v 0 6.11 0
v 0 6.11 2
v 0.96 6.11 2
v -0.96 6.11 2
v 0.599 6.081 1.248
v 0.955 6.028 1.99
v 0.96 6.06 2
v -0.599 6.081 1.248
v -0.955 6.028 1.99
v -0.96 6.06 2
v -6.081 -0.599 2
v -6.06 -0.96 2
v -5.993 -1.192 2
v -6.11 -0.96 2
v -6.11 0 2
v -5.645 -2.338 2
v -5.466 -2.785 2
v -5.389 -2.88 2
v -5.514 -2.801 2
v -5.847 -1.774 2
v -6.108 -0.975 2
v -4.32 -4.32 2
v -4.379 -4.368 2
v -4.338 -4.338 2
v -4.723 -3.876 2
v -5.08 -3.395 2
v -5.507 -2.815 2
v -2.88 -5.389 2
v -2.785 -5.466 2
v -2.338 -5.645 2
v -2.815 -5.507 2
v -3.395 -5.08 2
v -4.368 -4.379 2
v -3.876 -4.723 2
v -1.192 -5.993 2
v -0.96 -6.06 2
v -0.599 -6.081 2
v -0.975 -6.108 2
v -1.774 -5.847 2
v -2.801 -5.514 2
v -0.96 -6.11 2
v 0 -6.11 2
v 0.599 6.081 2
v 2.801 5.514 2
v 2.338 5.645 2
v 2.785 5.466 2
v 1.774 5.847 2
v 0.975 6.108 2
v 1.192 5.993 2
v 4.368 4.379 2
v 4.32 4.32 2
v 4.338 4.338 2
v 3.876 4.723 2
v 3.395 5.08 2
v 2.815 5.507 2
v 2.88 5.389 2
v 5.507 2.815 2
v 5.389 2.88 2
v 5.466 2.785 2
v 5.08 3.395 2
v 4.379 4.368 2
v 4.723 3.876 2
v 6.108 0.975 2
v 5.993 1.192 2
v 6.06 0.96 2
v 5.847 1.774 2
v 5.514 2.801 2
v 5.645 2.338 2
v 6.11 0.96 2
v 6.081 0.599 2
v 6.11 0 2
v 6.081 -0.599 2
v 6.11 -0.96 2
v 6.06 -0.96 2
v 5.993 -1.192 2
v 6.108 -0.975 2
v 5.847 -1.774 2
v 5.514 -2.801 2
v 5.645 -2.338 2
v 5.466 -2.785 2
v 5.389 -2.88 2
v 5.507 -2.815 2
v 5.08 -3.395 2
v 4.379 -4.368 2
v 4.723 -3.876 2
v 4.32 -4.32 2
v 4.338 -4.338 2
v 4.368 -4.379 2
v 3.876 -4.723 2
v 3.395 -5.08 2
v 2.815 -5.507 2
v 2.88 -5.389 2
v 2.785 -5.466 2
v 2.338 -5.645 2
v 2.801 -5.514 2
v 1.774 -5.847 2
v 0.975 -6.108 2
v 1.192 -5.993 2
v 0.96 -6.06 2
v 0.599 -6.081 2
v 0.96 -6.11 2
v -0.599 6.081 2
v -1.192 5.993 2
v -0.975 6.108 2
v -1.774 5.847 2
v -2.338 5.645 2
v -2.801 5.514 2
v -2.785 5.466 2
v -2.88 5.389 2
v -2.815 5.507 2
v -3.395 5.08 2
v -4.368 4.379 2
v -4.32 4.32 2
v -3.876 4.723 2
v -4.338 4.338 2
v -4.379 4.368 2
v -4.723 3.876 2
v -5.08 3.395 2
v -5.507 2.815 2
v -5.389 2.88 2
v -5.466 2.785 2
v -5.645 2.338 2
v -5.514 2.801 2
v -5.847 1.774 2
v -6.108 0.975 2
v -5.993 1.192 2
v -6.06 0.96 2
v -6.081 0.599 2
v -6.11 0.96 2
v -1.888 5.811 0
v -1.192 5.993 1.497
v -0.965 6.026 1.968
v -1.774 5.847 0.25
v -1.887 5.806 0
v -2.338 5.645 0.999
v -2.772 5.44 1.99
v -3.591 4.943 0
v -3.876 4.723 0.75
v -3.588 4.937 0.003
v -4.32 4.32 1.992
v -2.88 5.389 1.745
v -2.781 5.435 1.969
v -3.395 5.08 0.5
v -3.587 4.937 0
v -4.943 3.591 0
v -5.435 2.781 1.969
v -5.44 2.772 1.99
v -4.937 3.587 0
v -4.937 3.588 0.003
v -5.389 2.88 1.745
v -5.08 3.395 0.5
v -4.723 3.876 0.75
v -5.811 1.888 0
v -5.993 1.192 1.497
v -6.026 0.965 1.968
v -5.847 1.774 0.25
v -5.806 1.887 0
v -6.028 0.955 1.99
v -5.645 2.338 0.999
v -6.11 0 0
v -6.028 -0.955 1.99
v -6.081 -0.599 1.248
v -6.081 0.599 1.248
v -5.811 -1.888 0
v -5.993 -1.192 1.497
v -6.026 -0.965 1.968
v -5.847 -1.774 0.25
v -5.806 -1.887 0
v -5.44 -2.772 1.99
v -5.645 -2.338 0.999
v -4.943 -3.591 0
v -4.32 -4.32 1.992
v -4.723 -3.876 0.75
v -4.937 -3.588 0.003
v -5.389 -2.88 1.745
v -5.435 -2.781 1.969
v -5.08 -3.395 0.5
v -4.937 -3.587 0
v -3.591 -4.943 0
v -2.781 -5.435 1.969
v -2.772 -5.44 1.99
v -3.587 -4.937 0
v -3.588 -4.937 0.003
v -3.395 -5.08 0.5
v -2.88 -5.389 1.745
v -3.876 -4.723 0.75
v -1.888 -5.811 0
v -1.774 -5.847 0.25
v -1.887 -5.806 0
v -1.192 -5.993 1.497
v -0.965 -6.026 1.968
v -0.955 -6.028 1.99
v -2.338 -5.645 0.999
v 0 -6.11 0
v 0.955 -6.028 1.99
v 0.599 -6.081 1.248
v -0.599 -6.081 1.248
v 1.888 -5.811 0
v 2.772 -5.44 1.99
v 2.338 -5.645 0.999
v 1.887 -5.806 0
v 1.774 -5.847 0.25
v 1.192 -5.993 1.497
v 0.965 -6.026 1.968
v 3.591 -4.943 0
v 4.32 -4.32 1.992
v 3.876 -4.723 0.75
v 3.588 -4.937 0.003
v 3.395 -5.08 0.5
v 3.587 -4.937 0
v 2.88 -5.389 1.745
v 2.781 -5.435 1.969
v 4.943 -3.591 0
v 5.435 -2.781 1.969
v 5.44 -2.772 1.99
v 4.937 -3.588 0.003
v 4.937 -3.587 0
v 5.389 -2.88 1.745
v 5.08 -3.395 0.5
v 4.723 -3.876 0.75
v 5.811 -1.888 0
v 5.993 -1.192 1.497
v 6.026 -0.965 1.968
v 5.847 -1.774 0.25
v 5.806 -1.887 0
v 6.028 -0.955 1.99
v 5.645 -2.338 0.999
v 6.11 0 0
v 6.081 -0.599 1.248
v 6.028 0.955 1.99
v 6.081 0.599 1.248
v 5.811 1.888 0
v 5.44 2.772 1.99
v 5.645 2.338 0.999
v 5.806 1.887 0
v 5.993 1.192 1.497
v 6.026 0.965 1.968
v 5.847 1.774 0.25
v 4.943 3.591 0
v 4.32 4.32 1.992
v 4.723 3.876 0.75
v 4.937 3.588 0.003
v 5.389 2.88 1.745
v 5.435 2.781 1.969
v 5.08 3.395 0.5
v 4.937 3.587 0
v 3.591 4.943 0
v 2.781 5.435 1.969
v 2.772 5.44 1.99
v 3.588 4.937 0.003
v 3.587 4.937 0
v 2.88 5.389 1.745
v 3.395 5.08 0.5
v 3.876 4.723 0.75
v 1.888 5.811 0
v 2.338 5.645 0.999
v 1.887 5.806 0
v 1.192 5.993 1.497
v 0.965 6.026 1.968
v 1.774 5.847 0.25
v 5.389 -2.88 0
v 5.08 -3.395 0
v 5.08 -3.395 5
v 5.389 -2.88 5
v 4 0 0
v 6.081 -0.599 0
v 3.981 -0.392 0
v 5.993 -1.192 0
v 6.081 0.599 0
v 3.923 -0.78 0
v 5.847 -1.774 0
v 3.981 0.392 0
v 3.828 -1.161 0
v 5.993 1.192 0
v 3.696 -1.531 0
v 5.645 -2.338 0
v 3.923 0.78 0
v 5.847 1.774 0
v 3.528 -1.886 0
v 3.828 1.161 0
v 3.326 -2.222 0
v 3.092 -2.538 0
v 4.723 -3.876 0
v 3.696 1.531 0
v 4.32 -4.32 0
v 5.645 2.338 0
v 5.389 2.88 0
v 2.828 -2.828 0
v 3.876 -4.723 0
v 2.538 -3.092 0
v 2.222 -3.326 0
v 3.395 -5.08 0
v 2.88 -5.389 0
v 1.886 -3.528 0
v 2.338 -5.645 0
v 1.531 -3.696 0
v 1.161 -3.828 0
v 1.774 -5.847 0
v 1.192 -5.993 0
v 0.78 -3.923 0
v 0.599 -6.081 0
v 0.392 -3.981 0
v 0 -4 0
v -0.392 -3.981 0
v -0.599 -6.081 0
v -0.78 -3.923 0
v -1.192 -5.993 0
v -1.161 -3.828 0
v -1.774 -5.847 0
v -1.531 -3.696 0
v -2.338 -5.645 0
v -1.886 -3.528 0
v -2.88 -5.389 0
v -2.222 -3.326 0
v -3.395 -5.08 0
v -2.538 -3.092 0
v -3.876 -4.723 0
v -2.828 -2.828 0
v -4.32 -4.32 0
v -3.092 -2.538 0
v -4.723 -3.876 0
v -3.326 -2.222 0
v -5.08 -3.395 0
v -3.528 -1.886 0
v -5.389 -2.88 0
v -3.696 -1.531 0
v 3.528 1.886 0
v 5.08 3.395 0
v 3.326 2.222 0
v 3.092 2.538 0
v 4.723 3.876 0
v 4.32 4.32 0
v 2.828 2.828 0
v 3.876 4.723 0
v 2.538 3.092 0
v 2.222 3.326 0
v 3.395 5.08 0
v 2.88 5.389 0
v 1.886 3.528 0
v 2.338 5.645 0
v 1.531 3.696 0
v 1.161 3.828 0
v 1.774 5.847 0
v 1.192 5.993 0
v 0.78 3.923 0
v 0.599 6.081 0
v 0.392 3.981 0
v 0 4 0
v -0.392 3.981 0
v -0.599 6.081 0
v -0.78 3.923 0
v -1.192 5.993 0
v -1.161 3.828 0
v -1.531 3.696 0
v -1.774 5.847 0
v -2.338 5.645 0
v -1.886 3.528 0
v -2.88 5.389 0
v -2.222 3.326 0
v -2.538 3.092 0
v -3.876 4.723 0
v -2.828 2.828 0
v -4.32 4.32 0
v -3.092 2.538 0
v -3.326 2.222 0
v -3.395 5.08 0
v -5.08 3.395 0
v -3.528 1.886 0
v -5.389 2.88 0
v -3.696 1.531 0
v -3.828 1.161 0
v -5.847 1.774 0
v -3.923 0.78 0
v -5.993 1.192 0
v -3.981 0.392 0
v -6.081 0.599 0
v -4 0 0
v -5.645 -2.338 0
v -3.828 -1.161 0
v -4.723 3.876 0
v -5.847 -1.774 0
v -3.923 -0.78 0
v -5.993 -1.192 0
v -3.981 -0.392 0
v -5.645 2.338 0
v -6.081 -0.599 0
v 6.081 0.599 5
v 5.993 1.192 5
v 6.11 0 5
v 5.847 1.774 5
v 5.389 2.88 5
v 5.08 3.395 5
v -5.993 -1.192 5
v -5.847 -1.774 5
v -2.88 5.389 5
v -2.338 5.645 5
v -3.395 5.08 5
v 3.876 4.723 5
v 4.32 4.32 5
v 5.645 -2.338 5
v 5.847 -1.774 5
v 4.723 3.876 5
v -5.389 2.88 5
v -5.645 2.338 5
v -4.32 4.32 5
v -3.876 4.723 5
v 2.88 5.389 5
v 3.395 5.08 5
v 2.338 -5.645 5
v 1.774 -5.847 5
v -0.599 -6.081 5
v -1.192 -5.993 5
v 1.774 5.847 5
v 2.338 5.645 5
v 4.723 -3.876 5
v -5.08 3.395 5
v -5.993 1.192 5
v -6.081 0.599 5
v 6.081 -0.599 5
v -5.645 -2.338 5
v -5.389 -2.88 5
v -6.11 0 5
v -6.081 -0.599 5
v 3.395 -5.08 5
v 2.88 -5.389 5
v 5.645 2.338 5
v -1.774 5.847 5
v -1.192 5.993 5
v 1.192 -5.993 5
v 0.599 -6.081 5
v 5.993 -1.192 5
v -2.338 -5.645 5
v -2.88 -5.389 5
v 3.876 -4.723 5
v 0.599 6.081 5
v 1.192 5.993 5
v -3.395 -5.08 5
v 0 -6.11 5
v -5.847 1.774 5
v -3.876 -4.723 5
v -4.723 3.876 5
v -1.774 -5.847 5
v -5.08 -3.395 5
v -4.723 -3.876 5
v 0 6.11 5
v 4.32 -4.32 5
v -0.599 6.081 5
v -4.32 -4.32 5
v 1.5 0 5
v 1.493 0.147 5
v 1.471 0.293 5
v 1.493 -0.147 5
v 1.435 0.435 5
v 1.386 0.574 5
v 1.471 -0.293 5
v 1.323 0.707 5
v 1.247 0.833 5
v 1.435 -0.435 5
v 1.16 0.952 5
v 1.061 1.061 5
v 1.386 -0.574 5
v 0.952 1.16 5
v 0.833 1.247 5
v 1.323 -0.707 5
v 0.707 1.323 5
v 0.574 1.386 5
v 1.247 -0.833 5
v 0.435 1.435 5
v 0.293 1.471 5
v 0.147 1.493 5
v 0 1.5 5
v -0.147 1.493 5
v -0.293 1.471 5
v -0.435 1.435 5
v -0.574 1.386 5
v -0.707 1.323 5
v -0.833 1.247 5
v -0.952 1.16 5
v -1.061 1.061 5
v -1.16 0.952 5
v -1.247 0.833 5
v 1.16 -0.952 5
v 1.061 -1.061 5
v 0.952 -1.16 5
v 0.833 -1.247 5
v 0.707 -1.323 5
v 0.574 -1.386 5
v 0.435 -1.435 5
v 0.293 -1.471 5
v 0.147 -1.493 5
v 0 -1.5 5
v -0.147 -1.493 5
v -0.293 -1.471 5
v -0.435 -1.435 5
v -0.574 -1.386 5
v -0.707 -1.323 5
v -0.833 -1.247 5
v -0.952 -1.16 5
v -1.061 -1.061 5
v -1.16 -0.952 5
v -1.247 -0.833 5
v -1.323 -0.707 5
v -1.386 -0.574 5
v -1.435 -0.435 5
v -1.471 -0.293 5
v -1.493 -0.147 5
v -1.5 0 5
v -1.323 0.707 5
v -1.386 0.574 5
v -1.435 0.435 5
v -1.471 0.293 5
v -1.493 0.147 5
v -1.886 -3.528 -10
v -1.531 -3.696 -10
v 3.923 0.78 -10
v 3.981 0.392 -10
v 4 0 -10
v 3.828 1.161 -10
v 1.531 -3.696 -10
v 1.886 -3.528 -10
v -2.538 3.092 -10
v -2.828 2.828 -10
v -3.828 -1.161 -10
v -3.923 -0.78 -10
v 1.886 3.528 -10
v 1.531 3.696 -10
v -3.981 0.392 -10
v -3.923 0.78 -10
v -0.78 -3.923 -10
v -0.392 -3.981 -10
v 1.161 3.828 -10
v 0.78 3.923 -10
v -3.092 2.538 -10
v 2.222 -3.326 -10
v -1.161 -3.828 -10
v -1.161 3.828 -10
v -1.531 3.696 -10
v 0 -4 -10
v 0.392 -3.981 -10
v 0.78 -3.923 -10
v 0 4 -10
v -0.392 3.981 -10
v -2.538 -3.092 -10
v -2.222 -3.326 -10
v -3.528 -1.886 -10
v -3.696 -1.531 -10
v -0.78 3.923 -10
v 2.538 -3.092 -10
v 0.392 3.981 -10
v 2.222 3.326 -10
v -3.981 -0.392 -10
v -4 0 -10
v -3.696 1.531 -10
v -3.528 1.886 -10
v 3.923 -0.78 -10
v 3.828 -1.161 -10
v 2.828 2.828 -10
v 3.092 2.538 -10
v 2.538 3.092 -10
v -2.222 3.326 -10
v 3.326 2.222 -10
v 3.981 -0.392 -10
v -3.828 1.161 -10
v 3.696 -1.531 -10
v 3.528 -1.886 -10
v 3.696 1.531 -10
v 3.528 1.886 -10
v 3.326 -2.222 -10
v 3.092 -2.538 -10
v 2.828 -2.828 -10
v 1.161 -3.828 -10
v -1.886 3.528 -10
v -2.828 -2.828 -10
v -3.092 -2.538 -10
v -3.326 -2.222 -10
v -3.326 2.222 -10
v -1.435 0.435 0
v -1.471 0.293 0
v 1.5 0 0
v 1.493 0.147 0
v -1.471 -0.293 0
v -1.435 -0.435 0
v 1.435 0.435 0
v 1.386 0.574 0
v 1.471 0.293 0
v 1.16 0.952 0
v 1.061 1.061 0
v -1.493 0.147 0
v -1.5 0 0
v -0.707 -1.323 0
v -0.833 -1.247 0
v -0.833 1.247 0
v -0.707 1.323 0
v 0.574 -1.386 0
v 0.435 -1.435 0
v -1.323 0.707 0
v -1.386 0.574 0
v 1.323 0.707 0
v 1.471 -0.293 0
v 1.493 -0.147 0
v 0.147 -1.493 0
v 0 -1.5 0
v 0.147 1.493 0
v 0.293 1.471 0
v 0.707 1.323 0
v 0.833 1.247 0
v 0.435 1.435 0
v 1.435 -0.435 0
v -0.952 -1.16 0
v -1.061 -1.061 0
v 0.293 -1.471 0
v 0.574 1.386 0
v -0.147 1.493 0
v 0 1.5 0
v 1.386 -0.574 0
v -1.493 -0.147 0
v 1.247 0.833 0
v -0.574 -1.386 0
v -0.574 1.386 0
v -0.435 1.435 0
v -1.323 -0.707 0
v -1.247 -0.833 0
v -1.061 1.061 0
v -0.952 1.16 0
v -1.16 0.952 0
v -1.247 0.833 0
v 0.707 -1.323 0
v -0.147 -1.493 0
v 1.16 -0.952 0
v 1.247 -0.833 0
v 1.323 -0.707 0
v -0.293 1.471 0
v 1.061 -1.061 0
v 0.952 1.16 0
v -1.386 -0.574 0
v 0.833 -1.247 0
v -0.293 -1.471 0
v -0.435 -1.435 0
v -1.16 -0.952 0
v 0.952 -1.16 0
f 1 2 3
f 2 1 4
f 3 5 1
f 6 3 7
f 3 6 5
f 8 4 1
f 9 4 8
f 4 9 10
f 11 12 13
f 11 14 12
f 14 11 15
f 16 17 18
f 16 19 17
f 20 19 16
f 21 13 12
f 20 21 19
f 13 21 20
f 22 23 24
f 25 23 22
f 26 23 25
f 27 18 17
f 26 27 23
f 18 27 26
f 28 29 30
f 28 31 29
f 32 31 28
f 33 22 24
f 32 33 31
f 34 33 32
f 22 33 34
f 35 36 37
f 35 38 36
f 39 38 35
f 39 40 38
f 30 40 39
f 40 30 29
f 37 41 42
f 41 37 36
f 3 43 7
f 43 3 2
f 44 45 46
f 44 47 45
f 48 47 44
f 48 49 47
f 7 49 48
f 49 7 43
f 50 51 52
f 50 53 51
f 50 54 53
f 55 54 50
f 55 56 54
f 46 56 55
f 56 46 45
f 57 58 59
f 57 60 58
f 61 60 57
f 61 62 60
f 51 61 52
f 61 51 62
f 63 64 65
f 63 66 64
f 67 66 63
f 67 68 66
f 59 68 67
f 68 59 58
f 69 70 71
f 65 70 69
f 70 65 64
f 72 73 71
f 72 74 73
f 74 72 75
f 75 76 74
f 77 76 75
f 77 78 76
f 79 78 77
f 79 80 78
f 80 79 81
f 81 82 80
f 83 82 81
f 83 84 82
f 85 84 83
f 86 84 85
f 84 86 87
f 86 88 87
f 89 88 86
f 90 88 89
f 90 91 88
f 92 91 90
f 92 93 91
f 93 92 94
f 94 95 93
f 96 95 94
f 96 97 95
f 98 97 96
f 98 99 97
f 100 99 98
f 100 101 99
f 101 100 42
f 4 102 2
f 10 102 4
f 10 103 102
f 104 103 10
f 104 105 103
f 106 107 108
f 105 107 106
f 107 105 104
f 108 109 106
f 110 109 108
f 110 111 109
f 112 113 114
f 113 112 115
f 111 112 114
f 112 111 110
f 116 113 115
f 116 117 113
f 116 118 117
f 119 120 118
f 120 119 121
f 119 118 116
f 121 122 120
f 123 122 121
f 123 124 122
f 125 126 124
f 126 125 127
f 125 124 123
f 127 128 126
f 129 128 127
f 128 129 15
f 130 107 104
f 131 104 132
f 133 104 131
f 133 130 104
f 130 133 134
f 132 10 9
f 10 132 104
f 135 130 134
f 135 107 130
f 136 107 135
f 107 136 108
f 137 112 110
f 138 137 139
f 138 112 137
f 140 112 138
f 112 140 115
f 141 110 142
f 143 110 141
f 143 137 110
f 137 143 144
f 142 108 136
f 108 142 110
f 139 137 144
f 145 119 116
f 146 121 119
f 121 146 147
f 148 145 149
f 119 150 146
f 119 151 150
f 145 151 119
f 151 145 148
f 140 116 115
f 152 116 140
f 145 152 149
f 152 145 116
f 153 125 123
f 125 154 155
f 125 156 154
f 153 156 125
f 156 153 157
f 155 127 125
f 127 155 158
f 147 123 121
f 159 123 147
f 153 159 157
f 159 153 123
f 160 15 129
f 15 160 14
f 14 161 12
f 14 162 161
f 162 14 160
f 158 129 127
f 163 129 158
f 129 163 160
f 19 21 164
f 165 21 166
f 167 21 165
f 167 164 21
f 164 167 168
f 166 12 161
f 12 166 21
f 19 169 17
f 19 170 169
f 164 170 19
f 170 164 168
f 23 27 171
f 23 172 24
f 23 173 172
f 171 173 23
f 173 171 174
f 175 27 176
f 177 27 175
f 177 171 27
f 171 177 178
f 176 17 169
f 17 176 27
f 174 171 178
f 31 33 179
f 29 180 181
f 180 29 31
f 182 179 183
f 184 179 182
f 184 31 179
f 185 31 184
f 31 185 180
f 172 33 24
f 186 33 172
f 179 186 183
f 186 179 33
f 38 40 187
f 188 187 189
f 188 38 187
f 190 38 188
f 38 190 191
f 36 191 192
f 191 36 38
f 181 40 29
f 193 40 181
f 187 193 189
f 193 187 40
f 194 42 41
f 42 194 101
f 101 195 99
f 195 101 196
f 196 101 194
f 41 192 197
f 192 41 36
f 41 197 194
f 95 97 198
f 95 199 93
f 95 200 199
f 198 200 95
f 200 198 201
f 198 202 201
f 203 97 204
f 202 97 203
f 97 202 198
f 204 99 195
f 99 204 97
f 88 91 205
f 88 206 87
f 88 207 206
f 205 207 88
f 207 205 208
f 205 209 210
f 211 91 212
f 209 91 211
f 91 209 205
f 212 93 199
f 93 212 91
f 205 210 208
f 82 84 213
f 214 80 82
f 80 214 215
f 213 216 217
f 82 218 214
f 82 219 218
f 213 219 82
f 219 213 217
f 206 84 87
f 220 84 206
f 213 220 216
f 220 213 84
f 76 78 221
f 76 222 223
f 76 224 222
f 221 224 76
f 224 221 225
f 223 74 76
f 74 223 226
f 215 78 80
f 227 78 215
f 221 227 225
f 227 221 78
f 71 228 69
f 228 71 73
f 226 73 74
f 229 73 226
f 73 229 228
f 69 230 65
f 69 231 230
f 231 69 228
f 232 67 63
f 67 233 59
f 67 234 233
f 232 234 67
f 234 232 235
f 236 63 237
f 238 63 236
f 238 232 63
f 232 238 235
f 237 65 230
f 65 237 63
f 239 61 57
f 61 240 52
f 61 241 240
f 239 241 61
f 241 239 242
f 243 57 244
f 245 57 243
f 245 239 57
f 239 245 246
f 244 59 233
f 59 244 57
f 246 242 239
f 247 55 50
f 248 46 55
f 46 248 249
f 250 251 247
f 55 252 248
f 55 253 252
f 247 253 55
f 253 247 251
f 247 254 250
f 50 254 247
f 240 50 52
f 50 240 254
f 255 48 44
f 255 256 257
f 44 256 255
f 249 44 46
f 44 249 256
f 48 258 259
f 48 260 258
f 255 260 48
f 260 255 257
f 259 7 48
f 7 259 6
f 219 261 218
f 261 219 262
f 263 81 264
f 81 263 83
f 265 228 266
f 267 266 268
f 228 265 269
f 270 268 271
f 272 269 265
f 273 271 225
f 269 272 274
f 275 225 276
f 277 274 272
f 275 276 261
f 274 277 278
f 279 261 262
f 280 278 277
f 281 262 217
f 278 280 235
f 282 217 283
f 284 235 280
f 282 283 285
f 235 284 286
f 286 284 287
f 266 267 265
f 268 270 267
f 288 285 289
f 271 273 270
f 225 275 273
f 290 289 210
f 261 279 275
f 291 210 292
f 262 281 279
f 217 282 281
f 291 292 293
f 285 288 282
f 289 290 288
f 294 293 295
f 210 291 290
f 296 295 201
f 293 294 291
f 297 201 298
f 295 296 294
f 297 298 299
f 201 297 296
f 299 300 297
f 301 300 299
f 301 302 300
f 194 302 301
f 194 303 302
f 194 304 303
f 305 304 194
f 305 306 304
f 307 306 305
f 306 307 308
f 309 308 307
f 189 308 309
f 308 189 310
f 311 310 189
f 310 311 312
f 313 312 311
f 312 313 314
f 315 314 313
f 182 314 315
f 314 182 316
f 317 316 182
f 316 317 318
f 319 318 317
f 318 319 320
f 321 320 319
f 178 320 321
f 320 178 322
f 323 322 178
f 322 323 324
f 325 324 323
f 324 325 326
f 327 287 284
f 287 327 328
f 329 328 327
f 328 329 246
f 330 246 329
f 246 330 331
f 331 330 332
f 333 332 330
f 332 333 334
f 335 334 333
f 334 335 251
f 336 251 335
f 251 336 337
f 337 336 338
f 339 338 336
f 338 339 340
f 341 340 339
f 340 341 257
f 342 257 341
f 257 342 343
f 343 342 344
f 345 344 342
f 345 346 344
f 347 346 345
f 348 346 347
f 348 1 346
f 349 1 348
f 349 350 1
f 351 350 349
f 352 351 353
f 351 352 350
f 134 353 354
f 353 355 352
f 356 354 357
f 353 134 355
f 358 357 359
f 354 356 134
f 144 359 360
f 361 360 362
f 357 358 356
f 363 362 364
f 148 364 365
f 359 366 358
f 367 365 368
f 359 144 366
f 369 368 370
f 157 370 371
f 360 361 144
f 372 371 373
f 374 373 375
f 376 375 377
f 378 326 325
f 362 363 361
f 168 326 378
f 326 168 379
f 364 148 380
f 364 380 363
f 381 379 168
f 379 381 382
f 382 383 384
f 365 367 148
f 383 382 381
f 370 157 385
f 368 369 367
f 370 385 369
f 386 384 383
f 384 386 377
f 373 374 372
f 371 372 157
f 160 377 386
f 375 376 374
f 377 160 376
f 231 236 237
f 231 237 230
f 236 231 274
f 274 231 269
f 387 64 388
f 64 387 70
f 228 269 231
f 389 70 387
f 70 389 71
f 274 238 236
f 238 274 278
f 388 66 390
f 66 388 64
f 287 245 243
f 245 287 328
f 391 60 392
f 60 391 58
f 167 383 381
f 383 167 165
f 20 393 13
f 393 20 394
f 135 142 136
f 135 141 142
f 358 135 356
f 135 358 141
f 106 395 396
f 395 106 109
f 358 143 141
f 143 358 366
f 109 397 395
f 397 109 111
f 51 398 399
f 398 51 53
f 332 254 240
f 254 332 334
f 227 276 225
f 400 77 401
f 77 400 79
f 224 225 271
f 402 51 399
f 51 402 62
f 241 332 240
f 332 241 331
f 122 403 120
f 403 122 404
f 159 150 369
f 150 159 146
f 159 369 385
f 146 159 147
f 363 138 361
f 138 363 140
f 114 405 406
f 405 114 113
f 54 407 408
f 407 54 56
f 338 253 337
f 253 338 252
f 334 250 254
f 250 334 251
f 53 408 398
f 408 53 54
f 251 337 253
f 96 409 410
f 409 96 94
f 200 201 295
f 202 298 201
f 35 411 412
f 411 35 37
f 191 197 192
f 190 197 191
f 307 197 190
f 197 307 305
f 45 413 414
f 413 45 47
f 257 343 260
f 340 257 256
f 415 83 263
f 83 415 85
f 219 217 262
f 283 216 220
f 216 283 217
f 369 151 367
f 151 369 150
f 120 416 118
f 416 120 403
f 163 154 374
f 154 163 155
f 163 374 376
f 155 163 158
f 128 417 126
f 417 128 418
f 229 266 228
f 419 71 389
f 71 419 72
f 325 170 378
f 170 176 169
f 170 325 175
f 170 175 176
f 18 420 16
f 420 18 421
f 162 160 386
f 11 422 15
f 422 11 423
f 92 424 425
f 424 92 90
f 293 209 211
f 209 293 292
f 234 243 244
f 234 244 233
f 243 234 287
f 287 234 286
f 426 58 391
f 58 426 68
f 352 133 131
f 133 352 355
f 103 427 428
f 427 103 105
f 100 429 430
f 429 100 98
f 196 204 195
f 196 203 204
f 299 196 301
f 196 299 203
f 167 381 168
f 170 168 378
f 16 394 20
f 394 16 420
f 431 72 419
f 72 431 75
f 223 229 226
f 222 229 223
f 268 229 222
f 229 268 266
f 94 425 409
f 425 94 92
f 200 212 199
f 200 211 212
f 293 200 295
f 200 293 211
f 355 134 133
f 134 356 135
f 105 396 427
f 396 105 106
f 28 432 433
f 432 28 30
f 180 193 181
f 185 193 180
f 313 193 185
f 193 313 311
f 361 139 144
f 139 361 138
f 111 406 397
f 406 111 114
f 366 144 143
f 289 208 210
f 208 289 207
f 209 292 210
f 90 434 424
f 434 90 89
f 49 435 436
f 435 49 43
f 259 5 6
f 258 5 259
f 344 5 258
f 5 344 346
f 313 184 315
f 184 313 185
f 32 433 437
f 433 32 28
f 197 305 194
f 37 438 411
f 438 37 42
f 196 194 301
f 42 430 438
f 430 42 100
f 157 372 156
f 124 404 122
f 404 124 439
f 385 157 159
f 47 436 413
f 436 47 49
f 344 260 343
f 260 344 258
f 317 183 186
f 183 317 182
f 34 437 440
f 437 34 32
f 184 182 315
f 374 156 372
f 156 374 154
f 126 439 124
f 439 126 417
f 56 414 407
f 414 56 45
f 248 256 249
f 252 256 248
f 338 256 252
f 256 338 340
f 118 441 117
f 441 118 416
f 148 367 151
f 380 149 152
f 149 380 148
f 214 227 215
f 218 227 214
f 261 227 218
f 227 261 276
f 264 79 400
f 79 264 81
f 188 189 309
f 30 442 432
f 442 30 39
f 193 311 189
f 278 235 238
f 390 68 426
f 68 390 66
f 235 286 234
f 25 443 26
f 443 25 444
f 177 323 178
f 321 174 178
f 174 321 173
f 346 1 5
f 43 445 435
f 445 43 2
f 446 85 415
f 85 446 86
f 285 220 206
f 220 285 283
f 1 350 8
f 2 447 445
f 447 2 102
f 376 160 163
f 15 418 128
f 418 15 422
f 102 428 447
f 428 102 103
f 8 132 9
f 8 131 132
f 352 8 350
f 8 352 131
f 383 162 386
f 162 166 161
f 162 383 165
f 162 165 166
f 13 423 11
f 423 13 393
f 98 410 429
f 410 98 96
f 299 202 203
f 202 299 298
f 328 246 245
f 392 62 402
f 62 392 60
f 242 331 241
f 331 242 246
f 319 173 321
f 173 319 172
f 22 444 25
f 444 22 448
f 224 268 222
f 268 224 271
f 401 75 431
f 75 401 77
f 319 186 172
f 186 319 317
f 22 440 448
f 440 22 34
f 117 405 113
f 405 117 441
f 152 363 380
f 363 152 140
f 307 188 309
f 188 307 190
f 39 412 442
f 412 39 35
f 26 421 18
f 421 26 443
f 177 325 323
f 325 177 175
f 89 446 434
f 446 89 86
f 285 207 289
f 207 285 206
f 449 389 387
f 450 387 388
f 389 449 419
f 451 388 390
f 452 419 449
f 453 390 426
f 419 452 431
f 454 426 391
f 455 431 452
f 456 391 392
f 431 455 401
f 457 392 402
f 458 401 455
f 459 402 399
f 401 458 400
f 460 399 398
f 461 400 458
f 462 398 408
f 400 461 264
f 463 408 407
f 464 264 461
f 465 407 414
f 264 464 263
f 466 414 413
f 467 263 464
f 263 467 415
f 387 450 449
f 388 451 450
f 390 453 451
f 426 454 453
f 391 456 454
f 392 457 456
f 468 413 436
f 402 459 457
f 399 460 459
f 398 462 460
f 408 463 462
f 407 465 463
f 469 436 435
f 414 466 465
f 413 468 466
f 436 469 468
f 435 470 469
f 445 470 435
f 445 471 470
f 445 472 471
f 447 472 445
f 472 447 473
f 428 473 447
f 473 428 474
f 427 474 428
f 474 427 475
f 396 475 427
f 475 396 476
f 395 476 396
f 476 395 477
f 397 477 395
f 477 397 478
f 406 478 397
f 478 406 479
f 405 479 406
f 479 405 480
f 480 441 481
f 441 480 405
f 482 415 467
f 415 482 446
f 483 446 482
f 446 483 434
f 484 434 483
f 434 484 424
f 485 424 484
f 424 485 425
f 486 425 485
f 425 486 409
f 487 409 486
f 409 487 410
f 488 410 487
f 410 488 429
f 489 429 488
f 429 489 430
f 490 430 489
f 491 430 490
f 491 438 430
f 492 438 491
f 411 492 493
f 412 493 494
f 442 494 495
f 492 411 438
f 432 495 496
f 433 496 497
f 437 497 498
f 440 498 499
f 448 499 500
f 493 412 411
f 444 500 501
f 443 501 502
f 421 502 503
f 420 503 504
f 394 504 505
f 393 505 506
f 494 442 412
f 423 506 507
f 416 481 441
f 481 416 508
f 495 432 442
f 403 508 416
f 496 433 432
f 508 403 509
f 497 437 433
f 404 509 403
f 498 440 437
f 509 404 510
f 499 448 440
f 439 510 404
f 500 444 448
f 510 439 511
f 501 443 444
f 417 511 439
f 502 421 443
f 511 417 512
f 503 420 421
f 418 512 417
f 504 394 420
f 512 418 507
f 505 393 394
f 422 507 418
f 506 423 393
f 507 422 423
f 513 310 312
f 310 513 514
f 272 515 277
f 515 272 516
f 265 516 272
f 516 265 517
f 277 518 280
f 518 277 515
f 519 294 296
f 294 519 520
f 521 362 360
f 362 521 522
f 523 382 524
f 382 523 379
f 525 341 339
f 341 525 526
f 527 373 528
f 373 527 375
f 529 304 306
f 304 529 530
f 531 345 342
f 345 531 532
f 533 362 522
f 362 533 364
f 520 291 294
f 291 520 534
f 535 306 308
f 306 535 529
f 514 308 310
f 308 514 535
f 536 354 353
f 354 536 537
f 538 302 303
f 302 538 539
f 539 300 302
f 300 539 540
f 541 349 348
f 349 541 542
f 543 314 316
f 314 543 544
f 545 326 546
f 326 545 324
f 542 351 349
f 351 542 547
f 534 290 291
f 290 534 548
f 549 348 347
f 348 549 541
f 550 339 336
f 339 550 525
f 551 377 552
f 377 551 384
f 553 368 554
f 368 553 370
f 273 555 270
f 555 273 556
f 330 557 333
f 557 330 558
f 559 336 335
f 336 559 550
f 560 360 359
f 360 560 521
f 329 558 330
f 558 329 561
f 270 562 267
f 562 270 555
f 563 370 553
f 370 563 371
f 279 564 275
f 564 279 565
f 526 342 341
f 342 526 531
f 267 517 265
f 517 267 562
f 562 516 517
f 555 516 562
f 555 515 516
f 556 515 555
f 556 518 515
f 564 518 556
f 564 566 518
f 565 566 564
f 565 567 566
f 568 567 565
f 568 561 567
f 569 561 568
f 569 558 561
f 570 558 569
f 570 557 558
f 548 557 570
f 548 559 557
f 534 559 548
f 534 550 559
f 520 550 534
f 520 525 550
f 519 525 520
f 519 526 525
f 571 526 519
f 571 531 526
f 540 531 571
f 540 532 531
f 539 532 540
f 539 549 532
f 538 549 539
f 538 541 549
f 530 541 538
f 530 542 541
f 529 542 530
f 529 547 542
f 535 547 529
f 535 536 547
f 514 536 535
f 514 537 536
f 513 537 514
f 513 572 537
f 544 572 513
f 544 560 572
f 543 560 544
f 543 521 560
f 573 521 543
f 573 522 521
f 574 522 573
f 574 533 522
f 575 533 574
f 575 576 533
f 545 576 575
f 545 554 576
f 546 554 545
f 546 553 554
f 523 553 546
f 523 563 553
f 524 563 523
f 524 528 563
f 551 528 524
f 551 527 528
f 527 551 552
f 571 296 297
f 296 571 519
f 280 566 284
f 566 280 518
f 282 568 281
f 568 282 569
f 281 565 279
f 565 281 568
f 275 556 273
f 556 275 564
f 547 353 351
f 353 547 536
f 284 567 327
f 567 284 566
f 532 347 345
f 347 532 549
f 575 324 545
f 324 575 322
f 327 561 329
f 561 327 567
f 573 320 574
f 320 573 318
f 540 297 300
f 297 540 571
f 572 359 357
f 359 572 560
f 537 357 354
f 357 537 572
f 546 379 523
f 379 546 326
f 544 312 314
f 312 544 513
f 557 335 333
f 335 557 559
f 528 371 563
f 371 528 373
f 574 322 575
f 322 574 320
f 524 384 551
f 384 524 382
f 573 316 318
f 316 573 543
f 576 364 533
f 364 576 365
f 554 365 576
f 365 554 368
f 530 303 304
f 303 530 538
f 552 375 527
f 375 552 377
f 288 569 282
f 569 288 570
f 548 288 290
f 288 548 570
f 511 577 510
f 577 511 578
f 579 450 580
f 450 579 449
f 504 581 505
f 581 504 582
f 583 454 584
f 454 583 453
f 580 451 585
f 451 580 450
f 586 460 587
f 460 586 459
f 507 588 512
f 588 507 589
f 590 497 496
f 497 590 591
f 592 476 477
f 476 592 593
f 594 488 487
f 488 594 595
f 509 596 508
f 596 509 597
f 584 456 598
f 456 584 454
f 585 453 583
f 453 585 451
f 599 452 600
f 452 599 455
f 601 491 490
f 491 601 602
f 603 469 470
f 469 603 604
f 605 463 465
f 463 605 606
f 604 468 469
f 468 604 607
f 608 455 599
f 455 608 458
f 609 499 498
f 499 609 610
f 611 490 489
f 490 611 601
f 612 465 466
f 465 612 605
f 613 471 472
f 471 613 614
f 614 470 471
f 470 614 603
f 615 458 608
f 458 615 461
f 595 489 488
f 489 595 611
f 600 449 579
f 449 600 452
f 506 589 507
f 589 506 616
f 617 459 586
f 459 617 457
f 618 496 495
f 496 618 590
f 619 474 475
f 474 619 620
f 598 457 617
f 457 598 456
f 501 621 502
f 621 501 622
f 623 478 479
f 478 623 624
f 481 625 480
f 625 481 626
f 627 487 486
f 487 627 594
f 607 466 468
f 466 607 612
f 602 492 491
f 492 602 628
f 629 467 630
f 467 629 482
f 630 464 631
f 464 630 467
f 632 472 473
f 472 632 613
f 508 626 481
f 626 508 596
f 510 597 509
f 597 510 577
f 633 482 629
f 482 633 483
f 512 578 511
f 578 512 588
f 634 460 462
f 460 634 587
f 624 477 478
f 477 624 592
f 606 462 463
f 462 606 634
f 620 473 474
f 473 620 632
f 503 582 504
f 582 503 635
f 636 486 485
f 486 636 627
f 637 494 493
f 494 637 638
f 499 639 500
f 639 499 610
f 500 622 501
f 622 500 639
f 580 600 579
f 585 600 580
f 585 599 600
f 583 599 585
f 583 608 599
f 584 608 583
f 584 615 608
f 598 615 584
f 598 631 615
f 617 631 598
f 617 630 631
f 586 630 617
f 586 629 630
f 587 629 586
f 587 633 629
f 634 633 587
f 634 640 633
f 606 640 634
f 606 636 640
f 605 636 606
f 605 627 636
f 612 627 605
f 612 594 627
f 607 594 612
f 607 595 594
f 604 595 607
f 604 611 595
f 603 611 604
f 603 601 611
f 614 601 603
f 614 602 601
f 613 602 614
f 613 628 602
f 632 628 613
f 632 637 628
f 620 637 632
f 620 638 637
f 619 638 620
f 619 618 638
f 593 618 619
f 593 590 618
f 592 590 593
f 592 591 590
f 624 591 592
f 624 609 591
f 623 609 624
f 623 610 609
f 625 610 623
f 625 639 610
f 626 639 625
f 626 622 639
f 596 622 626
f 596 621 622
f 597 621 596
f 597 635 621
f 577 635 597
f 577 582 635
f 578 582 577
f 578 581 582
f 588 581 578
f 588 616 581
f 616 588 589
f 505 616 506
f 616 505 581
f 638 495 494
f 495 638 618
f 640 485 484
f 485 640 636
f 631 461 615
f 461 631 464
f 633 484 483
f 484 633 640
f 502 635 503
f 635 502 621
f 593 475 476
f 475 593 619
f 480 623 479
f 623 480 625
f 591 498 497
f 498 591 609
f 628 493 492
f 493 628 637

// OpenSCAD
module timing_pulley(teeth=20, pitch_diameter=12.22, belt_width=5, hub_diameter=8, hub_height=10) {
    tooth_height = 2;
    tooth_width = pitch_diameter * PI / teeth;
    pulley_height = belt_width + hub_height;
    
    module tooth() {
        translate([0, pitch_diameter / 2, 0])
        rotate([90, 0, 0])
        linear_extrude(height=belt_width)
        polygon(points=[[0, 0], [tooth_width / 2, tooth_height], [-tooth_width / 2, tooth_height]]);
    }
    
    difference() {
        union() {
            // Main pulley body
            cylinder(d=pitch_diameter, h=belt_width, $fn=64);
            
            // Hub
            translate([0, 0, -hub_height])
            cylinder(d=hub_diameter, h=hub_height, $fn=64);
            
            // Teeth
            for (i = [0:teeth-1]) {
                rotate([0, 0, i * 360 / teeth])
                tooth();
            }
        }
        
        // Bore hole
        cylinder(d=3, h=pulley_height, $fn=64);
    }
}

timing_pulley();
